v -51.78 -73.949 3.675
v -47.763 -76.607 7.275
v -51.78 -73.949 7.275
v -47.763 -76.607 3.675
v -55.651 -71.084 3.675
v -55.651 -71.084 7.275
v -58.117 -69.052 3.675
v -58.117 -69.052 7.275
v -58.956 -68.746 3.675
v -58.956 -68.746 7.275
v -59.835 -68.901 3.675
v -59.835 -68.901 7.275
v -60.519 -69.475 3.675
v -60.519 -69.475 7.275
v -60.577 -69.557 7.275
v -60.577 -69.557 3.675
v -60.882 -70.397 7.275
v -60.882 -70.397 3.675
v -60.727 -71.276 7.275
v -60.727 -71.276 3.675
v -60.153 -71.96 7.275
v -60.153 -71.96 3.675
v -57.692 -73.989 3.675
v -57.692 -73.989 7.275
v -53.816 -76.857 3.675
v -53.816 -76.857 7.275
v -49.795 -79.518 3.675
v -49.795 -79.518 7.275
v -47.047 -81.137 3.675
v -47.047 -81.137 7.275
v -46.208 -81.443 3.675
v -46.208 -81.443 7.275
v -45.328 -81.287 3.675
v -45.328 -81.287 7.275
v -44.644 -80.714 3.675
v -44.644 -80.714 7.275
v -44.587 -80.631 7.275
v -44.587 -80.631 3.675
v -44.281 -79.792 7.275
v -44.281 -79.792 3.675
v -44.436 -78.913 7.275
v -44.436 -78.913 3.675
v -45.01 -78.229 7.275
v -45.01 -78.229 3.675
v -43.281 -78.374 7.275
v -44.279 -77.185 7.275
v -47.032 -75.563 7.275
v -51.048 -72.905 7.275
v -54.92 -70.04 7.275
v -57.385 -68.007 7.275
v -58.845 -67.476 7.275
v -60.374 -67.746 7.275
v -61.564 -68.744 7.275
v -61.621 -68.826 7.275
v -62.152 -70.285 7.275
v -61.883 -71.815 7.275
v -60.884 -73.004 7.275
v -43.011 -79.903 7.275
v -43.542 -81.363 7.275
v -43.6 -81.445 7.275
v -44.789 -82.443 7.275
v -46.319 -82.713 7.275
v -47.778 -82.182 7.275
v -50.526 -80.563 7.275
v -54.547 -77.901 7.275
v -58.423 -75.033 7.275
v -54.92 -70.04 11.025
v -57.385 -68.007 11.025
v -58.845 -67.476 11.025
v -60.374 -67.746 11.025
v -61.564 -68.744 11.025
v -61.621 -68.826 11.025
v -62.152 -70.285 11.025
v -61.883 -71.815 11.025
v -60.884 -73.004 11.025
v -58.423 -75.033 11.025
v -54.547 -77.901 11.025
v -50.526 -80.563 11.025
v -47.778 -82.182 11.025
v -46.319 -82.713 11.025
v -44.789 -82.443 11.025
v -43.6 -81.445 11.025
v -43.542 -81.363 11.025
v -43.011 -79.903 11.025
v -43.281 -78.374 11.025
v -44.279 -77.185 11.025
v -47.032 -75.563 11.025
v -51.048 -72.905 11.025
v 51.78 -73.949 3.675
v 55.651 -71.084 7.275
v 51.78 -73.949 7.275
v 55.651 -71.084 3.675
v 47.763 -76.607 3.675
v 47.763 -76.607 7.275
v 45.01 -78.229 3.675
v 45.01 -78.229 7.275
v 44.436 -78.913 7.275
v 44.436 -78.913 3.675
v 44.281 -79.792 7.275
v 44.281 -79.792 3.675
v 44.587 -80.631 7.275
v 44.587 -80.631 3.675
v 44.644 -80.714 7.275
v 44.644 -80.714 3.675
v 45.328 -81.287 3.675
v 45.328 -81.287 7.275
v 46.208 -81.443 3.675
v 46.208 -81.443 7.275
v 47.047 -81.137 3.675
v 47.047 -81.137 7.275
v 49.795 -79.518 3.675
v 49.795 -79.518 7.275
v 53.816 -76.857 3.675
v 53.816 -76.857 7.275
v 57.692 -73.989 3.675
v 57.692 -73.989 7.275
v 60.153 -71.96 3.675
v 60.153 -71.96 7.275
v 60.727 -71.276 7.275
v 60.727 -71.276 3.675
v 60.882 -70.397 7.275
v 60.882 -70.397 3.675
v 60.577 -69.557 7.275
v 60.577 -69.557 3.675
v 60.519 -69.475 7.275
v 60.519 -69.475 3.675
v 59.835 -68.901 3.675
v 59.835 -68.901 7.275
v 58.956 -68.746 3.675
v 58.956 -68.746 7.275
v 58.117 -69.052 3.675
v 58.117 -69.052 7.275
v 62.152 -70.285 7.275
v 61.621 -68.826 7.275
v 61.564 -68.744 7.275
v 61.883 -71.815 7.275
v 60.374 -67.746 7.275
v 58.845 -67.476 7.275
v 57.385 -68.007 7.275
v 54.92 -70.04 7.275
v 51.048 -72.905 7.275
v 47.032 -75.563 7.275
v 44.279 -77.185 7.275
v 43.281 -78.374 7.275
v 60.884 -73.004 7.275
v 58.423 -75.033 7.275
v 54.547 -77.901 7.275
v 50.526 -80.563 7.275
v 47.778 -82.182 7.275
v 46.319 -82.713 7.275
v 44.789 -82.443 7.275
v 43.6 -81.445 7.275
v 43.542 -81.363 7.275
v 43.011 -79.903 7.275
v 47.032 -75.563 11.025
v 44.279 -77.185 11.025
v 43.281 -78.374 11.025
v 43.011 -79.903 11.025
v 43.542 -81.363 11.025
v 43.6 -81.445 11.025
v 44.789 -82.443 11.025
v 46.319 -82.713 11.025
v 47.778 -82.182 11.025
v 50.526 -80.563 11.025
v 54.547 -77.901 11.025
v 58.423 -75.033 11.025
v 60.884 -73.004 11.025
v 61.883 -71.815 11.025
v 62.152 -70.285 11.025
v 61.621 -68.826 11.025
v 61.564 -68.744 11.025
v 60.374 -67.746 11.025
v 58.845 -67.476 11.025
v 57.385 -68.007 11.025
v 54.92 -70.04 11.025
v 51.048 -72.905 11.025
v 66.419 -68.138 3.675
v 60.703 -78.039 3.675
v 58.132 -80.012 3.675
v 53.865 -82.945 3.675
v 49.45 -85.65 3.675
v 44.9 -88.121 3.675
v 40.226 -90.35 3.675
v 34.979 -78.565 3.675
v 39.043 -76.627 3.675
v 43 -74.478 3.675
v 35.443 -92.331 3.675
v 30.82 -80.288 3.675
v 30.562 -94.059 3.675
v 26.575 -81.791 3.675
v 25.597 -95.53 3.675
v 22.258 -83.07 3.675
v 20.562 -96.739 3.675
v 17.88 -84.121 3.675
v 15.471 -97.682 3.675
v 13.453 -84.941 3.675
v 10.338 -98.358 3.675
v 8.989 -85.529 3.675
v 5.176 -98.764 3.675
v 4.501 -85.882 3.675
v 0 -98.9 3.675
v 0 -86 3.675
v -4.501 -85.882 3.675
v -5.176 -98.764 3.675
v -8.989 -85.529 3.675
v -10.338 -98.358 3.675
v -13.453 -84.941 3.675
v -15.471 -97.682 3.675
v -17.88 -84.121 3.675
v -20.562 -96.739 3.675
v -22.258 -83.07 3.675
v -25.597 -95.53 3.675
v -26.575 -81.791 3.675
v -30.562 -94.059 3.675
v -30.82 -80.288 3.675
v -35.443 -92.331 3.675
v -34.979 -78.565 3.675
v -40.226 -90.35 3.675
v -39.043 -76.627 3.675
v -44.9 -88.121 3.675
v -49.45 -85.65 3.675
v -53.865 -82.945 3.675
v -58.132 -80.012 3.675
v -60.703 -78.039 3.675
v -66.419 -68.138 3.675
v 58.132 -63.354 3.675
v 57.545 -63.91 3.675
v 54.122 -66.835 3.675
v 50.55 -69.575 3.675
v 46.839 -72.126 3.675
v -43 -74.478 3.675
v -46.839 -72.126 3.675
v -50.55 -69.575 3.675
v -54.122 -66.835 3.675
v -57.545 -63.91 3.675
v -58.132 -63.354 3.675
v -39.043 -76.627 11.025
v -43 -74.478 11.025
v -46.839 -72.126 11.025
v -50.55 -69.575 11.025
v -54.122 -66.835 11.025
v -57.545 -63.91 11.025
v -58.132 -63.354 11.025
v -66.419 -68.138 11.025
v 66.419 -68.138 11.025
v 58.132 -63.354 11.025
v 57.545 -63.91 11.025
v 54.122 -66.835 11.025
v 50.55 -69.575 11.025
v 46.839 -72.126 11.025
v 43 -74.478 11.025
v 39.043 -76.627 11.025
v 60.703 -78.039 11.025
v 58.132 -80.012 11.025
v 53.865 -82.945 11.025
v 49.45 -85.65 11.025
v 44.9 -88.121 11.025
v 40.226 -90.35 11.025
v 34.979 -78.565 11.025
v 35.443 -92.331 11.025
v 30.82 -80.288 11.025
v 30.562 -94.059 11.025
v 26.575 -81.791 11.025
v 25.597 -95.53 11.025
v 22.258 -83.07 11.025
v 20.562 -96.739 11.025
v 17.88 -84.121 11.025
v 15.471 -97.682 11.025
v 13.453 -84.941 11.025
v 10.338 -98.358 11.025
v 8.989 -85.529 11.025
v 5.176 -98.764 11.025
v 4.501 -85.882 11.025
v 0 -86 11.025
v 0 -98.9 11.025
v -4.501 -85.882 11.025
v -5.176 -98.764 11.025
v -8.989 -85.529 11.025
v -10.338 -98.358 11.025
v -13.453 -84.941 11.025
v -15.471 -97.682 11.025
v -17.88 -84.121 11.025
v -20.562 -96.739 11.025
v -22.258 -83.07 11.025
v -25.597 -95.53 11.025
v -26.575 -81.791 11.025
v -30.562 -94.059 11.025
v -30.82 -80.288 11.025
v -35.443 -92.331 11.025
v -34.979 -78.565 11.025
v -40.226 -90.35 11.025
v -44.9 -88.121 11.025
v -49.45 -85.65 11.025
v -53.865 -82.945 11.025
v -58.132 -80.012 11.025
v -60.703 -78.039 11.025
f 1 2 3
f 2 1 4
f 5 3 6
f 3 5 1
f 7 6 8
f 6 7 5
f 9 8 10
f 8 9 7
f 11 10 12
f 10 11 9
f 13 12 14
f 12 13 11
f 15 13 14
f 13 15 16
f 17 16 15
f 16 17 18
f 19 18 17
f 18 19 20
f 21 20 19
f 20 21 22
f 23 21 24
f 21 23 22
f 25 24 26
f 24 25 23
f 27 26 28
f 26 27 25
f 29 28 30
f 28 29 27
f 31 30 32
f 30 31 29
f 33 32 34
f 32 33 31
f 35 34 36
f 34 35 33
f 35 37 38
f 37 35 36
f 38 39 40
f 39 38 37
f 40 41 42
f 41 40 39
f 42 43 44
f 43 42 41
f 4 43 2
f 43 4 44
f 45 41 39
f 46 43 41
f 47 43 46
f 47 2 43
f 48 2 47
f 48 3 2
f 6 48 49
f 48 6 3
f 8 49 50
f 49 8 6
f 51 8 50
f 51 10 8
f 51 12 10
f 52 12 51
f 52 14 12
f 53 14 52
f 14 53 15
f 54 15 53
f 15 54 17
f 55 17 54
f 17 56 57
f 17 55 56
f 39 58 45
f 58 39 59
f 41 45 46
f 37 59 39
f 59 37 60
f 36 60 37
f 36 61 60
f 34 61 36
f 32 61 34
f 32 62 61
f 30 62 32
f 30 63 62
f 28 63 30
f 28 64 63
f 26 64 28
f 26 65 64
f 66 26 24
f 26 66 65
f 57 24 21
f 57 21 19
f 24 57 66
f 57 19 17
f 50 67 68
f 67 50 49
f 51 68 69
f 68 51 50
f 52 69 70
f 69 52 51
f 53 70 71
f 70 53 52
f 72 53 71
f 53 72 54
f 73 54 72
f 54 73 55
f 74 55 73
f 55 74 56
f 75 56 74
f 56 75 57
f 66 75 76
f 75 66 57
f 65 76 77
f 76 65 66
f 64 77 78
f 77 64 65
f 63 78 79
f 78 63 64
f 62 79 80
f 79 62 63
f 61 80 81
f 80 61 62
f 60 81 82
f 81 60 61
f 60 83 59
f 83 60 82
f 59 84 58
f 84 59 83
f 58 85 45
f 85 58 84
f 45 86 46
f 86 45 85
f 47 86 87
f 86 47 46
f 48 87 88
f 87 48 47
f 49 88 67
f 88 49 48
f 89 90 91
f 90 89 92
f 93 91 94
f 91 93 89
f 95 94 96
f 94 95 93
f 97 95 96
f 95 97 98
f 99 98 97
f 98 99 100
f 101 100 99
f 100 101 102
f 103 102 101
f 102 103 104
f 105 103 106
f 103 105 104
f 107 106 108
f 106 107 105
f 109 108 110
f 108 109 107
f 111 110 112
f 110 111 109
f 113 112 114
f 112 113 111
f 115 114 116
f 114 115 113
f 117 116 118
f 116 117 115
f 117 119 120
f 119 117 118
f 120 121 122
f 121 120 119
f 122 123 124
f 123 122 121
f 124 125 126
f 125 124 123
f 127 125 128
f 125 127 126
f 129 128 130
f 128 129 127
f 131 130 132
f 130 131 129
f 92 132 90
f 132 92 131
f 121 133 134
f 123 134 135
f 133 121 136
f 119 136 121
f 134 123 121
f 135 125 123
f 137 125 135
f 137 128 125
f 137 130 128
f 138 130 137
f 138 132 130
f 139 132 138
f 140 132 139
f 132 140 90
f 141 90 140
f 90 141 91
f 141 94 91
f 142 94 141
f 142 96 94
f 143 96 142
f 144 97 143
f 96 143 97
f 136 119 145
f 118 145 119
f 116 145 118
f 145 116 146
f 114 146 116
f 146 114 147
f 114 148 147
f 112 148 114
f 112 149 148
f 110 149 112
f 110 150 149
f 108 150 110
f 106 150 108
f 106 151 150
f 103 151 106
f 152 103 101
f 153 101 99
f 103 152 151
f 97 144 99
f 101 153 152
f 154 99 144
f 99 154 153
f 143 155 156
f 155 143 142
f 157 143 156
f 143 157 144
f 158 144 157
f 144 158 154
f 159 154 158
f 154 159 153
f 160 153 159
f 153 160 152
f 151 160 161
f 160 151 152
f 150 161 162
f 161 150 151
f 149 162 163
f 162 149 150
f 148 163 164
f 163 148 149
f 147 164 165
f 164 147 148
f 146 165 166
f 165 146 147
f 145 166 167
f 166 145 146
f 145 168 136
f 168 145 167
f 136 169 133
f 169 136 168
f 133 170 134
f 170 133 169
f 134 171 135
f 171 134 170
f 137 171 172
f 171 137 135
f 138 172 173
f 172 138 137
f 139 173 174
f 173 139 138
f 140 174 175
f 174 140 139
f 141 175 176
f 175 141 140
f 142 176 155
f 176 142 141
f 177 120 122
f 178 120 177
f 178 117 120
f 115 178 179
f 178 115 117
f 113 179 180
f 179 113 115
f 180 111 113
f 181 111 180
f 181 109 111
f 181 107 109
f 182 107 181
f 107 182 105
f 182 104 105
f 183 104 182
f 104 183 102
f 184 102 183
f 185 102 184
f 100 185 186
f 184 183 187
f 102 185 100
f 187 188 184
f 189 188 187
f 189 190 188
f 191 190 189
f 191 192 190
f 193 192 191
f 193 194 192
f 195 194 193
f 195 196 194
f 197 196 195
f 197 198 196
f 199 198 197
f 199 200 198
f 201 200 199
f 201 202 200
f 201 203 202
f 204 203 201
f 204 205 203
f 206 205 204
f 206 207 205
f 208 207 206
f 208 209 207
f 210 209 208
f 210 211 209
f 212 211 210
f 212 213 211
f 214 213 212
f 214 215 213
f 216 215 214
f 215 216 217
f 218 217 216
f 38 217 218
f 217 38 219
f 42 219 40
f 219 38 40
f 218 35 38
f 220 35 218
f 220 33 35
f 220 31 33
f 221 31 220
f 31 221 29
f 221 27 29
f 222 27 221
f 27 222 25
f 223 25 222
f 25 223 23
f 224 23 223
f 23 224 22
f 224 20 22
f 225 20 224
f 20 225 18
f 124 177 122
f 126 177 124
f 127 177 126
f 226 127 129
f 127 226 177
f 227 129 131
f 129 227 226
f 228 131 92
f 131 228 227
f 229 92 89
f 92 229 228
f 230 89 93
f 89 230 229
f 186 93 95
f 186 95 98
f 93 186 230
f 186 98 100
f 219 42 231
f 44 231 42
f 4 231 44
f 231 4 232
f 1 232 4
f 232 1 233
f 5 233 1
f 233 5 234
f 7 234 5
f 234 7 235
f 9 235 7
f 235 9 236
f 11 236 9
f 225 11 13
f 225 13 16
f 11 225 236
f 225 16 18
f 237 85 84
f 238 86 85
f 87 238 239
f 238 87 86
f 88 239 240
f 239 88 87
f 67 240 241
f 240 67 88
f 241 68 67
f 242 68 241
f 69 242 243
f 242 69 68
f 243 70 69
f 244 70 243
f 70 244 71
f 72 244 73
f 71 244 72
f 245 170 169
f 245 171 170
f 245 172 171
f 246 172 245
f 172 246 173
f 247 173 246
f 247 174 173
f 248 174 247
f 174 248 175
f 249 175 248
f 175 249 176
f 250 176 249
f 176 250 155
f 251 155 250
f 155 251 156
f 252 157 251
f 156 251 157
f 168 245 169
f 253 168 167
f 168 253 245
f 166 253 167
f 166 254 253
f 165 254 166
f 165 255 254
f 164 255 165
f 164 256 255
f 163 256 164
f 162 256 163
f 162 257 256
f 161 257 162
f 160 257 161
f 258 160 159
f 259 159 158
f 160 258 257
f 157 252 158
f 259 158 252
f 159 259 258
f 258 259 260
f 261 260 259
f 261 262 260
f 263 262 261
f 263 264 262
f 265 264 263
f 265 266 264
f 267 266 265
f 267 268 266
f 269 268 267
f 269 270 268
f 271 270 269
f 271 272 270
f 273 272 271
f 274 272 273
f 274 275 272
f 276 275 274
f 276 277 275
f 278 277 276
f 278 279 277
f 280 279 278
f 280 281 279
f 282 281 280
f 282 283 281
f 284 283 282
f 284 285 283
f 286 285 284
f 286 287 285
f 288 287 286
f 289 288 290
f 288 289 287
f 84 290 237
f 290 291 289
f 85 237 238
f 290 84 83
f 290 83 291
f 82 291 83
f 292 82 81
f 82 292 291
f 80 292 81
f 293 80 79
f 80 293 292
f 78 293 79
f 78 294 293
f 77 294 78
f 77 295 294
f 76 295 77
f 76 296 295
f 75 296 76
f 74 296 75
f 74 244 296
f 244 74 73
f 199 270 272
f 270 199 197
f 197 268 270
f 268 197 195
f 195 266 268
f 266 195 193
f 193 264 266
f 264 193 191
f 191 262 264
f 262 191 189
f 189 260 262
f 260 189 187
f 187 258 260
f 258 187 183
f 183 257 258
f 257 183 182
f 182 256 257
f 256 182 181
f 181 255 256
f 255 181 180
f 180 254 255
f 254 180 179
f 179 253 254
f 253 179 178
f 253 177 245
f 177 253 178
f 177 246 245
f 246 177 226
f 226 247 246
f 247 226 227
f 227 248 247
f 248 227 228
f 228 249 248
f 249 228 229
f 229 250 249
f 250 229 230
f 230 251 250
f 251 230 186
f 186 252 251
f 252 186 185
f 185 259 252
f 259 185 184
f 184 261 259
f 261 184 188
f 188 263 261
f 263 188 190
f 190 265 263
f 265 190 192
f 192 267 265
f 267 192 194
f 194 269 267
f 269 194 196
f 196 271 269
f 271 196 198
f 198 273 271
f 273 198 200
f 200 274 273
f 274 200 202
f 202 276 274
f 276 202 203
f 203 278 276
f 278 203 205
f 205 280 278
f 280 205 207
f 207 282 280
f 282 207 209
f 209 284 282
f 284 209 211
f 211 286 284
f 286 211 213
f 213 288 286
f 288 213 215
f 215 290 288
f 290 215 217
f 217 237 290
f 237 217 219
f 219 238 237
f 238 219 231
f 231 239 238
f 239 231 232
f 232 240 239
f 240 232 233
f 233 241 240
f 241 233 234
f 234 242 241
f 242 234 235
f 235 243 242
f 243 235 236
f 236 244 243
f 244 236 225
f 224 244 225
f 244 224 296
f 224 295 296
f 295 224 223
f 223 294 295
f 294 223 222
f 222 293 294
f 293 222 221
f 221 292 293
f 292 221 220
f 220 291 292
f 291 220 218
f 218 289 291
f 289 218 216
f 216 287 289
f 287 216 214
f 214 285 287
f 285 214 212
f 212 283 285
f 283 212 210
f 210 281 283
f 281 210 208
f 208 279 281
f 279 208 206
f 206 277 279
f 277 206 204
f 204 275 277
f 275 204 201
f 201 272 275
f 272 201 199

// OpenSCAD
// file: configuration.scad
// Increase this if your slicer or printer make holes too tight.
extra_radius = 0.1;

// OD = outside diameter, corner to corner.
m3_nut_od = 6.1;
m3_nut_radius = m3_nut_od/2 + 0.2 + extra_radius;
m3_washer_radius = 3.5 + extra_radius;

// Major diameter of metric 3mm thread.
m3_major = 2.85;
m3_radius = m3_major/2 + extra_radius;
m3_wide_radius = m3_major/2 + extra_radius + 0.2;

// NEMA17 stepper motors.
motor_shaft_diameter = 5;
motor_shaft_radius = motor_shaft_diameter/2 + extra_radius;

// Frame brackets. M3x8mm screws work best with 3.6 mm brackets.
thickness = 3.6;

// OpenBeam or Misumi. Currently only 15x15 mm, but there is a plan
// to make models more parametric and allow 20x20 mm in the future.
extrusion = 15;

// Placement for the NEMA17 stepper motors.
motor_offset = 44;
motor_length = 47;
// main file
include <configuration.scad>;

fsr_height = 1.0;
height = 25.4 / 4 + fsr_height;
glass_radius = 172 / 2;
outside_radius = glass_radius * 1.15;
triangle_radius = glass_radius * 2.13;

module curve_slot(r, h) {
  linear_extrude(h) minkowski() {
    circle(r=r, h=2*height, center=true, $fn=12);
    intersection() {
      square([16, 3*glass_radius], center=true);
      difference() {
        circle(r=glass_radius+6.1, $fn=120);
        circle(r=glass_radius+6, $fn=120);
      }
    }
  }
}

module glass_frame() {
  difference() {
    linear_extrude(height=height) {
      difference() {
        intersection() {
          rotate([0, 0, 30]) circle(r=triangle_radius, $fn=3);
          circle(r=outside_radius, $fn=120);
        }
        circle(r=glass_radius, $fn=120);
        for (a = [0:120:359]) {
          rotate([0, 0, a]) translate([0, glass_radius])
            square([glass_radius*0.6, glass_radius], center=true);
        }
        translate([0, glass_radius / 2])
          square([2*triangle_radius, triangle_radius], center=true);
      }
    }
    for (a = [-35, 35]) rotate([0, 0, a]) {
	  translate([0, 0, -height/2]) #
        curve_slot(r=m3_wide_radius, h=2*height);
	  translate([0, 0, thickness]) #
        curve_slot(r=3, h=2*height);
    }
  }
}

translate([0, 0, height/2])
glass_frame();
